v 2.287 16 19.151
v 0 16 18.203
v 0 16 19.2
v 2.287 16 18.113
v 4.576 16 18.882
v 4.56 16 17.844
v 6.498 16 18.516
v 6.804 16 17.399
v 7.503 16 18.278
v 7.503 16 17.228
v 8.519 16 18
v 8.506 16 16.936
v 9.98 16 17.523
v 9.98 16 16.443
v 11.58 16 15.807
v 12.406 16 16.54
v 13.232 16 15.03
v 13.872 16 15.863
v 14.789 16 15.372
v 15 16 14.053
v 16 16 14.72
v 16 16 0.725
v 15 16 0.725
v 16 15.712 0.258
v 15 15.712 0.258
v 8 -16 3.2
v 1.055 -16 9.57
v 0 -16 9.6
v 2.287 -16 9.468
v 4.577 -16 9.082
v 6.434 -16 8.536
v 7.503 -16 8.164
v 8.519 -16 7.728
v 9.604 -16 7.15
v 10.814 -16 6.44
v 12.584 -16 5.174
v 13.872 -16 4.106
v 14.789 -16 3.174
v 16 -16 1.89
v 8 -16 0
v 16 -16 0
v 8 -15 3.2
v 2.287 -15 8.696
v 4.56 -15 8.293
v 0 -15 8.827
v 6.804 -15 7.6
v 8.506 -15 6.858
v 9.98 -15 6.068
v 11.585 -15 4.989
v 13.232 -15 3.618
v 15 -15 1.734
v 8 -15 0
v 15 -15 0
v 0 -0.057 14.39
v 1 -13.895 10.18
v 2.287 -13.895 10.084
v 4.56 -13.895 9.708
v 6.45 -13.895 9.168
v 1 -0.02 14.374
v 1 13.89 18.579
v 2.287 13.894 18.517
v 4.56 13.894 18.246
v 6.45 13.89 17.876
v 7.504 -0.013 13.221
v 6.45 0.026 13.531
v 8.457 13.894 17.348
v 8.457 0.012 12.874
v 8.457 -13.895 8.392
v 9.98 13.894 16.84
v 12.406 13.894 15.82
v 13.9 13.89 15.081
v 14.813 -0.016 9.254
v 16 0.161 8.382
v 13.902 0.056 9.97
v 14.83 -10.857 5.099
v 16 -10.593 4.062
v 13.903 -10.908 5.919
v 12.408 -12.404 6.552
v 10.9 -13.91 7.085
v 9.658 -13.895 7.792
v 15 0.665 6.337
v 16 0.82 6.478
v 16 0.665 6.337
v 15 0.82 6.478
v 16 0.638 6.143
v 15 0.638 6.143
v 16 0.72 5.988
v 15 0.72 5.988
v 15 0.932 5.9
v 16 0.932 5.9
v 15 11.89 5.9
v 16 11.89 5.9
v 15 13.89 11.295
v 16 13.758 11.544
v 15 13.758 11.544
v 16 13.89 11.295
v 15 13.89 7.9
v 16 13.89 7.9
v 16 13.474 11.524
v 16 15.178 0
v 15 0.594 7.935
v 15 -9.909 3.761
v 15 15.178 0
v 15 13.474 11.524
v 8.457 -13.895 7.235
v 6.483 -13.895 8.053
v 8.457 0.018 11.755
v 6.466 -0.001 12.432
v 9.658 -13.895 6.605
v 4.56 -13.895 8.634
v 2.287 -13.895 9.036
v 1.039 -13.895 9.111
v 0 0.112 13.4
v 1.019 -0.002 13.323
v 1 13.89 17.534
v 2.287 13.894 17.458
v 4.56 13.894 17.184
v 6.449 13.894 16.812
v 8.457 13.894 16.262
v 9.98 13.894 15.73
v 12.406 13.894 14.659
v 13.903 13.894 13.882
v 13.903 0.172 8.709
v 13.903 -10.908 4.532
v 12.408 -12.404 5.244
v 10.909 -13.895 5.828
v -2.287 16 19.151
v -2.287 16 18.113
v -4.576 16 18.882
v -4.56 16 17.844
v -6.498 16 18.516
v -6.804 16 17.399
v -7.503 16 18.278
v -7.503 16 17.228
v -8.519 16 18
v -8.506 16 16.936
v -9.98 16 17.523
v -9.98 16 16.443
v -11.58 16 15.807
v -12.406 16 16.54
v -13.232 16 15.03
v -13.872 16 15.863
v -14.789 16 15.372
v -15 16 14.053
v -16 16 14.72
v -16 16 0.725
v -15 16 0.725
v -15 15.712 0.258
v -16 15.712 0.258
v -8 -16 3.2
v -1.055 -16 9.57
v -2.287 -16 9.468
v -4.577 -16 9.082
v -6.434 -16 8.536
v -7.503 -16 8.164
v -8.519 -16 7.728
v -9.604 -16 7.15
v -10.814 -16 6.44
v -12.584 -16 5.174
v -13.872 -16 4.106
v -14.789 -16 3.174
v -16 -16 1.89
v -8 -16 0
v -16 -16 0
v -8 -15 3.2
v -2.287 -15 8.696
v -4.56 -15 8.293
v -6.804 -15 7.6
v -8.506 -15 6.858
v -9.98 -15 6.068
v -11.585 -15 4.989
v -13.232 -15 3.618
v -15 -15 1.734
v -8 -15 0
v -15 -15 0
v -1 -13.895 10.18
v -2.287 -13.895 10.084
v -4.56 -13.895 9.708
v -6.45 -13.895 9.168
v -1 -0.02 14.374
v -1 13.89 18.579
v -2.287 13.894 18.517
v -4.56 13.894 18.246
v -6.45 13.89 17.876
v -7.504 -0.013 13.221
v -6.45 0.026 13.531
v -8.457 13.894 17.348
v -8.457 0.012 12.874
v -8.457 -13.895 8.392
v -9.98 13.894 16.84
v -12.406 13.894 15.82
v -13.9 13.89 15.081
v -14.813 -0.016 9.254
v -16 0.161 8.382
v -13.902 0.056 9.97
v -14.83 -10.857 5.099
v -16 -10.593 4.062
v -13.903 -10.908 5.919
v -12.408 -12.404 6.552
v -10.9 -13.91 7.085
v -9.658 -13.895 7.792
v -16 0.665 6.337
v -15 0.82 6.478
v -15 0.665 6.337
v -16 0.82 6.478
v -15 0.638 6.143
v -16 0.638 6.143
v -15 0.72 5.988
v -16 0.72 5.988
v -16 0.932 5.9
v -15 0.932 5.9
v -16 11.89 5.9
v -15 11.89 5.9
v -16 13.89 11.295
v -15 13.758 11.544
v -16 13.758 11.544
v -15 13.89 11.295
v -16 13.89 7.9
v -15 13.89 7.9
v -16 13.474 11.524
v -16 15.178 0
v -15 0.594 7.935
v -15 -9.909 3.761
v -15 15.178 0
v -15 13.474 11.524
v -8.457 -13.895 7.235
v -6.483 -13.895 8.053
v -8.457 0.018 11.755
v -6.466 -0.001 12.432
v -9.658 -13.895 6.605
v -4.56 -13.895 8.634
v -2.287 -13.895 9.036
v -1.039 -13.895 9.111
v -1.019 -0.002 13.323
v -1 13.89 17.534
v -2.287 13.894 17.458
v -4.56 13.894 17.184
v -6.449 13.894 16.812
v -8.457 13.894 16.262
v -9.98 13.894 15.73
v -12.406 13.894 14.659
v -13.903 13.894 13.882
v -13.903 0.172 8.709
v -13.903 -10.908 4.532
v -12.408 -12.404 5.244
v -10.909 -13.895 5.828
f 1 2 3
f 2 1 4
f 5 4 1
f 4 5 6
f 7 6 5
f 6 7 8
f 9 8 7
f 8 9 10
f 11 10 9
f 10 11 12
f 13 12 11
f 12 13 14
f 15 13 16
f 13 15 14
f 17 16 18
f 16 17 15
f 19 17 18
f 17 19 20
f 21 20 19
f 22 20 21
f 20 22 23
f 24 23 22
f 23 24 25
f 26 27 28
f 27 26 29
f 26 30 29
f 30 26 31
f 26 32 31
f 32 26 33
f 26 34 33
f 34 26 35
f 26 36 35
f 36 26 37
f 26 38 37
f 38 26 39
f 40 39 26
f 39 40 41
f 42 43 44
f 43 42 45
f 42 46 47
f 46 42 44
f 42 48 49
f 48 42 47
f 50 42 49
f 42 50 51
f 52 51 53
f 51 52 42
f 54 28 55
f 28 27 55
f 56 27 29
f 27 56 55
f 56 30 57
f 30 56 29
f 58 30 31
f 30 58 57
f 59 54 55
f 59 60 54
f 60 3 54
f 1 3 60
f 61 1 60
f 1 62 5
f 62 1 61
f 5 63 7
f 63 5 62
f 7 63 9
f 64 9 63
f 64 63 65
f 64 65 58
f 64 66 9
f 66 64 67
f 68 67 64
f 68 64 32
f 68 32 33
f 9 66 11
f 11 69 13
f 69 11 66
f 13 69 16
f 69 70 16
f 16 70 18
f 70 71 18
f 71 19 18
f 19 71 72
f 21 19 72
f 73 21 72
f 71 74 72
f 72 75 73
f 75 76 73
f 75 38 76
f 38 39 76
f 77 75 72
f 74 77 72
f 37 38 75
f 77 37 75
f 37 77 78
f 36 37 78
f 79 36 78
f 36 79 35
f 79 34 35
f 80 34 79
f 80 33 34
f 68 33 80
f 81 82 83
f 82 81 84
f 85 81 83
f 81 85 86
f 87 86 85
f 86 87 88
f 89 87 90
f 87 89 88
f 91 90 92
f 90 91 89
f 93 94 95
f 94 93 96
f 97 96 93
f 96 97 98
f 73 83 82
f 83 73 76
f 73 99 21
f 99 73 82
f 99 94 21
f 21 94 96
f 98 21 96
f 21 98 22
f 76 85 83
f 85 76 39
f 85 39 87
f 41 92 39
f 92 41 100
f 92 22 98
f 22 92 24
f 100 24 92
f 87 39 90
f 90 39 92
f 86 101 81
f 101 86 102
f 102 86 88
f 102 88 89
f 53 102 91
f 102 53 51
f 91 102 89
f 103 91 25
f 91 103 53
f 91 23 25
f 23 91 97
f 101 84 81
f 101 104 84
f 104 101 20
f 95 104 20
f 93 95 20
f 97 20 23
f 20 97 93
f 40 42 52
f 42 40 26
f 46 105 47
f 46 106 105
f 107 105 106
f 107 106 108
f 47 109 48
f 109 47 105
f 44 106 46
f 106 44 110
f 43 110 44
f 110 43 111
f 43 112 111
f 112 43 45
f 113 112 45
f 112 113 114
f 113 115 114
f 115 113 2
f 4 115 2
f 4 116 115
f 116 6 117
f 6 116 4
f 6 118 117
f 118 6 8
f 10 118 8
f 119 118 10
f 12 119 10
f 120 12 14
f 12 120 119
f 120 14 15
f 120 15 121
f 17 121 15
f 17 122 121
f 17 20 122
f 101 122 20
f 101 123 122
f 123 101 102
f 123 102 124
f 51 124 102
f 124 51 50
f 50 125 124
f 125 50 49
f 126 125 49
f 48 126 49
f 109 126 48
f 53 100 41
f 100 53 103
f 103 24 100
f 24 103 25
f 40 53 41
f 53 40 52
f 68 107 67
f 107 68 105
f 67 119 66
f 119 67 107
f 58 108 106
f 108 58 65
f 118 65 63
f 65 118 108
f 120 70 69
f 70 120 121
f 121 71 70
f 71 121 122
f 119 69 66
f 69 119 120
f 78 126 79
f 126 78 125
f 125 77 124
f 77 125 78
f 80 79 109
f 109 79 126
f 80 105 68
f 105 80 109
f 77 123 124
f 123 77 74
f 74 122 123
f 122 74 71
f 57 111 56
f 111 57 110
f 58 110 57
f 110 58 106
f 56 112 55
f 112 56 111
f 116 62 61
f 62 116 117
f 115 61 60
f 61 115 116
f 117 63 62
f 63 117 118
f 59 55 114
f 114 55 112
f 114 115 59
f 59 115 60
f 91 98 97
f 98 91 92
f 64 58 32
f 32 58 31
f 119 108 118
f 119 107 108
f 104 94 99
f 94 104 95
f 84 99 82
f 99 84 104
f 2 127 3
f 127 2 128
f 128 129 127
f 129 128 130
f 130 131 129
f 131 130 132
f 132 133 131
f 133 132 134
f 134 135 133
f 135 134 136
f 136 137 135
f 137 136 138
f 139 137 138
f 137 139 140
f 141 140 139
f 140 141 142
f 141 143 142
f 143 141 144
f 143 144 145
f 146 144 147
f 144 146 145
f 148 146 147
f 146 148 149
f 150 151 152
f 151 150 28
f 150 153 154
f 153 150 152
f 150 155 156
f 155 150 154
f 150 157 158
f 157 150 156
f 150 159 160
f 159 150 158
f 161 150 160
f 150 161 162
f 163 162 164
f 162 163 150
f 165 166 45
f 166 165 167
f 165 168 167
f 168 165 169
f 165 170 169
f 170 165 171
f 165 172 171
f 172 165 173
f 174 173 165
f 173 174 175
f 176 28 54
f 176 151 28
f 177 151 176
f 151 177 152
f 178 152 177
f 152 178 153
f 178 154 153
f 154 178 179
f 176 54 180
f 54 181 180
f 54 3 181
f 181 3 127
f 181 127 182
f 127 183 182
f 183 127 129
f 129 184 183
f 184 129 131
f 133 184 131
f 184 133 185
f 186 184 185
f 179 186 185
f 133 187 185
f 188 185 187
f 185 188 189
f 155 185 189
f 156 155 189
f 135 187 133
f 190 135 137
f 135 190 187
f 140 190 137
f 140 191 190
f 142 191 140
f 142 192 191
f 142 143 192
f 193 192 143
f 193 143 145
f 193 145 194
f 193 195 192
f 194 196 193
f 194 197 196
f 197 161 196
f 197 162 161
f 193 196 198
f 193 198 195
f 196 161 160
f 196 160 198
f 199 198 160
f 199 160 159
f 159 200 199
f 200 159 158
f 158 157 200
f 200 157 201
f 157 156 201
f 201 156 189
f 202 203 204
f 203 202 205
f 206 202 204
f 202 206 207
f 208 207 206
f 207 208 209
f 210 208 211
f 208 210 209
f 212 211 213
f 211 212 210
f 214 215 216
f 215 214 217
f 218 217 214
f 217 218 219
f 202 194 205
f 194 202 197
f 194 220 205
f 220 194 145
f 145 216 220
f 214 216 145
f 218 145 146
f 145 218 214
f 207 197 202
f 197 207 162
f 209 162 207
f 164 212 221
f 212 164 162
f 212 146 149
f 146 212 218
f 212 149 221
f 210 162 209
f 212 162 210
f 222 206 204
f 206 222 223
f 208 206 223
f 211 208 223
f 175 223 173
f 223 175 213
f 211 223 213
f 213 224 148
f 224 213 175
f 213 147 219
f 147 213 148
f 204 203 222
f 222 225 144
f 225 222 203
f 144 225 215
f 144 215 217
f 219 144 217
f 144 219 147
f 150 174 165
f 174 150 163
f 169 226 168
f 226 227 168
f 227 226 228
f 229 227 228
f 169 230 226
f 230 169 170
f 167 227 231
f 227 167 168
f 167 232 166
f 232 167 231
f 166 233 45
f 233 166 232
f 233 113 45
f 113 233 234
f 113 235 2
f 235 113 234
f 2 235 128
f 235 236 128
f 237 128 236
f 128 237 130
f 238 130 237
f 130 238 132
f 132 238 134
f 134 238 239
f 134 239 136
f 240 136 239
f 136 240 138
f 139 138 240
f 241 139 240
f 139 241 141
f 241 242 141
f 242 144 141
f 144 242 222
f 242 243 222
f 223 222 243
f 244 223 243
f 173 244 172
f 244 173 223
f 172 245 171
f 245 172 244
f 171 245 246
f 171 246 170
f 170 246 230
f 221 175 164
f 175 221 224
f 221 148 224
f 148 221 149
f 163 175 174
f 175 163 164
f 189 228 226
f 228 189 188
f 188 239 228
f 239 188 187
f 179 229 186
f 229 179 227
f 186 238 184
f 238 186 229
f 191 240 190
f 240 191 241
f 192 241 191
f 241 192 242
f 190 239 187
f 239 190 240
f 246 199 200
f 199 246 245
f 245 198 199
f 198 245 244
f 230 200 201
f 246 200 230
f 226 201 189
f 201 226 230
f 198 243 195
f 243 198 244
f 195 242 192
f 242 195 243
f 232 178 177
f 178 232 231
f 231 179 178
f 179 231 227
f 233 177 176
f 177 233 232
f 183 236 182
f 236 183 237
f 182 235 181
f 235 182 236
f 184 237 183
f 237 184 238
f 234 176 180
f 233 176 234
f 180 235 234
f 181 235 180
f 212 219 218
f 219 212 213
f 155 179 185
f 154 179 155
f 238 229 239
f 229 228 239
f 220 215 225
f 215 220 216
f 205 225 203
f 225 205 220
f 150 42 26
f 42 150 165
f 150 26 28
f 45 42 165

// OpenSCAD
use <../../lib.scad>
use <103918s04.scad>
function ldraw_lib__s__103918s02() = [
// 0 ~Windscreen  4 x  4 x  2 with Integral Glass - Frame
// 0 Name: s\103918s02.dat
// 0 Author: Magnus Forsberg [MagFors]
// 0 !LDRAW_ORG Subpart UPDATE 2024-05
// 0 !LICENSE Licensed under CC BY 4.0 : see CAreadme.txt
// 
// 0 BFC CERTIFY CCW
  [0,"BFC","CERTIFY"],
  [0,"BFC","CCW"],
// 
// 0 !HISTORY 2023-08-23 {LEGO Instructions App} Original part shape
// 0 !HISTORY 2023-10-07 [MagFors] File preparation for LDraw Parts Tracker
// 0 !HISTORY 2024-06-30 [OrionP] Official Update 2024-05
// 
// 1 16 0 0 0 1 0 0 0 1 0 0 0 1 s\103918s04.dat
  [1,16,0,0,0,1,0,0,0,1,0,0,0,1, ldraw_lib__s__103918s04()],
// 1 16 0 0 0 -1 0 0 0 1 0 0 0 1 s\103918s04.dat
  [1,16,0,0,0,-1,0,0,0,1,0,0,0,1, ldraw_lib__s__103918s04()],
// 4 16 20 -8 -37.5 20 -8 -40 -20 -8 -40 -20 -8 -37.5
  [4,16,20,-8,-37.5,20,-8,-40,-20,-8,-40,-20,-8,-37.5],
// 3 16 -20 -8 -40 20 -8 -40 0 -24 -40
  [3,16,-20,-8,-40,20,-8,-40,0,-24,-40],
// 3 16 0 -22.068 -37.5 20 -8 -37.5 -20 -8 -37.5
  [3,16,0,-22.068,-37.5,20,-8,-37.5,-20,-8,-37.5],
// 2 24 20 -8 -40 -20 -8 -40
  [2,24,20,-8,-40,-20,-8,-40],
// 5 24 0 -24 -40 0 -35.975 -.142 2.5 -25.449 -34.738 -2.5 -25.449 -34.738
  [5,24,0,-24,-40,0,-35.975,-.142,2.5,-25.449,-34.738,-2.5,-25.449,-34.738],
// 5 24 0 -45.508 40 0 -33.5 .279 -2.5 -43.834 34.725 2.5 -43.834 34.725
  [5,24,0,-45.508,40,0,-33.5,.279,-2.5,-43.834,34.725,2.5,-43.834,34.725],
// 5 24 0 -22.068 -37.5 0 -33.5 .279 -2.597 -22.777 -34.738 2.597 -22.777 -34.738
  [5,24,0,-22.068,-37.5,0,-33.5,.279,-2.597,-22.777,-34.738,2.597,-22.777,-34.738],
// 5 24 0 -35.975 -.142 0 -48 40 -2.5 -46.448 34.725 2.5 -46.448 34.725
  [5,24,0,-35.975,-.142,0,-48,40,-2.5,-46.448,34.725,2.5,-46.448,34.725],
// 2 24 20 -8 -37.5 -20 -8 -37.5
  [2,24,20,-8,-37.5,-20,-8,-37.5],
];
module ldraw_lib__s__103918s02(step=0, col=false, unit=2/5, alt=false, line=0.2, solid=!$preview)
    makepoly(ldraw_lib__s__103918s02(), step=step, col=col, unit=unit, alt=alt, line=line, solid=solid);
ldraw_lib__s__103918s02(line=0.2);
